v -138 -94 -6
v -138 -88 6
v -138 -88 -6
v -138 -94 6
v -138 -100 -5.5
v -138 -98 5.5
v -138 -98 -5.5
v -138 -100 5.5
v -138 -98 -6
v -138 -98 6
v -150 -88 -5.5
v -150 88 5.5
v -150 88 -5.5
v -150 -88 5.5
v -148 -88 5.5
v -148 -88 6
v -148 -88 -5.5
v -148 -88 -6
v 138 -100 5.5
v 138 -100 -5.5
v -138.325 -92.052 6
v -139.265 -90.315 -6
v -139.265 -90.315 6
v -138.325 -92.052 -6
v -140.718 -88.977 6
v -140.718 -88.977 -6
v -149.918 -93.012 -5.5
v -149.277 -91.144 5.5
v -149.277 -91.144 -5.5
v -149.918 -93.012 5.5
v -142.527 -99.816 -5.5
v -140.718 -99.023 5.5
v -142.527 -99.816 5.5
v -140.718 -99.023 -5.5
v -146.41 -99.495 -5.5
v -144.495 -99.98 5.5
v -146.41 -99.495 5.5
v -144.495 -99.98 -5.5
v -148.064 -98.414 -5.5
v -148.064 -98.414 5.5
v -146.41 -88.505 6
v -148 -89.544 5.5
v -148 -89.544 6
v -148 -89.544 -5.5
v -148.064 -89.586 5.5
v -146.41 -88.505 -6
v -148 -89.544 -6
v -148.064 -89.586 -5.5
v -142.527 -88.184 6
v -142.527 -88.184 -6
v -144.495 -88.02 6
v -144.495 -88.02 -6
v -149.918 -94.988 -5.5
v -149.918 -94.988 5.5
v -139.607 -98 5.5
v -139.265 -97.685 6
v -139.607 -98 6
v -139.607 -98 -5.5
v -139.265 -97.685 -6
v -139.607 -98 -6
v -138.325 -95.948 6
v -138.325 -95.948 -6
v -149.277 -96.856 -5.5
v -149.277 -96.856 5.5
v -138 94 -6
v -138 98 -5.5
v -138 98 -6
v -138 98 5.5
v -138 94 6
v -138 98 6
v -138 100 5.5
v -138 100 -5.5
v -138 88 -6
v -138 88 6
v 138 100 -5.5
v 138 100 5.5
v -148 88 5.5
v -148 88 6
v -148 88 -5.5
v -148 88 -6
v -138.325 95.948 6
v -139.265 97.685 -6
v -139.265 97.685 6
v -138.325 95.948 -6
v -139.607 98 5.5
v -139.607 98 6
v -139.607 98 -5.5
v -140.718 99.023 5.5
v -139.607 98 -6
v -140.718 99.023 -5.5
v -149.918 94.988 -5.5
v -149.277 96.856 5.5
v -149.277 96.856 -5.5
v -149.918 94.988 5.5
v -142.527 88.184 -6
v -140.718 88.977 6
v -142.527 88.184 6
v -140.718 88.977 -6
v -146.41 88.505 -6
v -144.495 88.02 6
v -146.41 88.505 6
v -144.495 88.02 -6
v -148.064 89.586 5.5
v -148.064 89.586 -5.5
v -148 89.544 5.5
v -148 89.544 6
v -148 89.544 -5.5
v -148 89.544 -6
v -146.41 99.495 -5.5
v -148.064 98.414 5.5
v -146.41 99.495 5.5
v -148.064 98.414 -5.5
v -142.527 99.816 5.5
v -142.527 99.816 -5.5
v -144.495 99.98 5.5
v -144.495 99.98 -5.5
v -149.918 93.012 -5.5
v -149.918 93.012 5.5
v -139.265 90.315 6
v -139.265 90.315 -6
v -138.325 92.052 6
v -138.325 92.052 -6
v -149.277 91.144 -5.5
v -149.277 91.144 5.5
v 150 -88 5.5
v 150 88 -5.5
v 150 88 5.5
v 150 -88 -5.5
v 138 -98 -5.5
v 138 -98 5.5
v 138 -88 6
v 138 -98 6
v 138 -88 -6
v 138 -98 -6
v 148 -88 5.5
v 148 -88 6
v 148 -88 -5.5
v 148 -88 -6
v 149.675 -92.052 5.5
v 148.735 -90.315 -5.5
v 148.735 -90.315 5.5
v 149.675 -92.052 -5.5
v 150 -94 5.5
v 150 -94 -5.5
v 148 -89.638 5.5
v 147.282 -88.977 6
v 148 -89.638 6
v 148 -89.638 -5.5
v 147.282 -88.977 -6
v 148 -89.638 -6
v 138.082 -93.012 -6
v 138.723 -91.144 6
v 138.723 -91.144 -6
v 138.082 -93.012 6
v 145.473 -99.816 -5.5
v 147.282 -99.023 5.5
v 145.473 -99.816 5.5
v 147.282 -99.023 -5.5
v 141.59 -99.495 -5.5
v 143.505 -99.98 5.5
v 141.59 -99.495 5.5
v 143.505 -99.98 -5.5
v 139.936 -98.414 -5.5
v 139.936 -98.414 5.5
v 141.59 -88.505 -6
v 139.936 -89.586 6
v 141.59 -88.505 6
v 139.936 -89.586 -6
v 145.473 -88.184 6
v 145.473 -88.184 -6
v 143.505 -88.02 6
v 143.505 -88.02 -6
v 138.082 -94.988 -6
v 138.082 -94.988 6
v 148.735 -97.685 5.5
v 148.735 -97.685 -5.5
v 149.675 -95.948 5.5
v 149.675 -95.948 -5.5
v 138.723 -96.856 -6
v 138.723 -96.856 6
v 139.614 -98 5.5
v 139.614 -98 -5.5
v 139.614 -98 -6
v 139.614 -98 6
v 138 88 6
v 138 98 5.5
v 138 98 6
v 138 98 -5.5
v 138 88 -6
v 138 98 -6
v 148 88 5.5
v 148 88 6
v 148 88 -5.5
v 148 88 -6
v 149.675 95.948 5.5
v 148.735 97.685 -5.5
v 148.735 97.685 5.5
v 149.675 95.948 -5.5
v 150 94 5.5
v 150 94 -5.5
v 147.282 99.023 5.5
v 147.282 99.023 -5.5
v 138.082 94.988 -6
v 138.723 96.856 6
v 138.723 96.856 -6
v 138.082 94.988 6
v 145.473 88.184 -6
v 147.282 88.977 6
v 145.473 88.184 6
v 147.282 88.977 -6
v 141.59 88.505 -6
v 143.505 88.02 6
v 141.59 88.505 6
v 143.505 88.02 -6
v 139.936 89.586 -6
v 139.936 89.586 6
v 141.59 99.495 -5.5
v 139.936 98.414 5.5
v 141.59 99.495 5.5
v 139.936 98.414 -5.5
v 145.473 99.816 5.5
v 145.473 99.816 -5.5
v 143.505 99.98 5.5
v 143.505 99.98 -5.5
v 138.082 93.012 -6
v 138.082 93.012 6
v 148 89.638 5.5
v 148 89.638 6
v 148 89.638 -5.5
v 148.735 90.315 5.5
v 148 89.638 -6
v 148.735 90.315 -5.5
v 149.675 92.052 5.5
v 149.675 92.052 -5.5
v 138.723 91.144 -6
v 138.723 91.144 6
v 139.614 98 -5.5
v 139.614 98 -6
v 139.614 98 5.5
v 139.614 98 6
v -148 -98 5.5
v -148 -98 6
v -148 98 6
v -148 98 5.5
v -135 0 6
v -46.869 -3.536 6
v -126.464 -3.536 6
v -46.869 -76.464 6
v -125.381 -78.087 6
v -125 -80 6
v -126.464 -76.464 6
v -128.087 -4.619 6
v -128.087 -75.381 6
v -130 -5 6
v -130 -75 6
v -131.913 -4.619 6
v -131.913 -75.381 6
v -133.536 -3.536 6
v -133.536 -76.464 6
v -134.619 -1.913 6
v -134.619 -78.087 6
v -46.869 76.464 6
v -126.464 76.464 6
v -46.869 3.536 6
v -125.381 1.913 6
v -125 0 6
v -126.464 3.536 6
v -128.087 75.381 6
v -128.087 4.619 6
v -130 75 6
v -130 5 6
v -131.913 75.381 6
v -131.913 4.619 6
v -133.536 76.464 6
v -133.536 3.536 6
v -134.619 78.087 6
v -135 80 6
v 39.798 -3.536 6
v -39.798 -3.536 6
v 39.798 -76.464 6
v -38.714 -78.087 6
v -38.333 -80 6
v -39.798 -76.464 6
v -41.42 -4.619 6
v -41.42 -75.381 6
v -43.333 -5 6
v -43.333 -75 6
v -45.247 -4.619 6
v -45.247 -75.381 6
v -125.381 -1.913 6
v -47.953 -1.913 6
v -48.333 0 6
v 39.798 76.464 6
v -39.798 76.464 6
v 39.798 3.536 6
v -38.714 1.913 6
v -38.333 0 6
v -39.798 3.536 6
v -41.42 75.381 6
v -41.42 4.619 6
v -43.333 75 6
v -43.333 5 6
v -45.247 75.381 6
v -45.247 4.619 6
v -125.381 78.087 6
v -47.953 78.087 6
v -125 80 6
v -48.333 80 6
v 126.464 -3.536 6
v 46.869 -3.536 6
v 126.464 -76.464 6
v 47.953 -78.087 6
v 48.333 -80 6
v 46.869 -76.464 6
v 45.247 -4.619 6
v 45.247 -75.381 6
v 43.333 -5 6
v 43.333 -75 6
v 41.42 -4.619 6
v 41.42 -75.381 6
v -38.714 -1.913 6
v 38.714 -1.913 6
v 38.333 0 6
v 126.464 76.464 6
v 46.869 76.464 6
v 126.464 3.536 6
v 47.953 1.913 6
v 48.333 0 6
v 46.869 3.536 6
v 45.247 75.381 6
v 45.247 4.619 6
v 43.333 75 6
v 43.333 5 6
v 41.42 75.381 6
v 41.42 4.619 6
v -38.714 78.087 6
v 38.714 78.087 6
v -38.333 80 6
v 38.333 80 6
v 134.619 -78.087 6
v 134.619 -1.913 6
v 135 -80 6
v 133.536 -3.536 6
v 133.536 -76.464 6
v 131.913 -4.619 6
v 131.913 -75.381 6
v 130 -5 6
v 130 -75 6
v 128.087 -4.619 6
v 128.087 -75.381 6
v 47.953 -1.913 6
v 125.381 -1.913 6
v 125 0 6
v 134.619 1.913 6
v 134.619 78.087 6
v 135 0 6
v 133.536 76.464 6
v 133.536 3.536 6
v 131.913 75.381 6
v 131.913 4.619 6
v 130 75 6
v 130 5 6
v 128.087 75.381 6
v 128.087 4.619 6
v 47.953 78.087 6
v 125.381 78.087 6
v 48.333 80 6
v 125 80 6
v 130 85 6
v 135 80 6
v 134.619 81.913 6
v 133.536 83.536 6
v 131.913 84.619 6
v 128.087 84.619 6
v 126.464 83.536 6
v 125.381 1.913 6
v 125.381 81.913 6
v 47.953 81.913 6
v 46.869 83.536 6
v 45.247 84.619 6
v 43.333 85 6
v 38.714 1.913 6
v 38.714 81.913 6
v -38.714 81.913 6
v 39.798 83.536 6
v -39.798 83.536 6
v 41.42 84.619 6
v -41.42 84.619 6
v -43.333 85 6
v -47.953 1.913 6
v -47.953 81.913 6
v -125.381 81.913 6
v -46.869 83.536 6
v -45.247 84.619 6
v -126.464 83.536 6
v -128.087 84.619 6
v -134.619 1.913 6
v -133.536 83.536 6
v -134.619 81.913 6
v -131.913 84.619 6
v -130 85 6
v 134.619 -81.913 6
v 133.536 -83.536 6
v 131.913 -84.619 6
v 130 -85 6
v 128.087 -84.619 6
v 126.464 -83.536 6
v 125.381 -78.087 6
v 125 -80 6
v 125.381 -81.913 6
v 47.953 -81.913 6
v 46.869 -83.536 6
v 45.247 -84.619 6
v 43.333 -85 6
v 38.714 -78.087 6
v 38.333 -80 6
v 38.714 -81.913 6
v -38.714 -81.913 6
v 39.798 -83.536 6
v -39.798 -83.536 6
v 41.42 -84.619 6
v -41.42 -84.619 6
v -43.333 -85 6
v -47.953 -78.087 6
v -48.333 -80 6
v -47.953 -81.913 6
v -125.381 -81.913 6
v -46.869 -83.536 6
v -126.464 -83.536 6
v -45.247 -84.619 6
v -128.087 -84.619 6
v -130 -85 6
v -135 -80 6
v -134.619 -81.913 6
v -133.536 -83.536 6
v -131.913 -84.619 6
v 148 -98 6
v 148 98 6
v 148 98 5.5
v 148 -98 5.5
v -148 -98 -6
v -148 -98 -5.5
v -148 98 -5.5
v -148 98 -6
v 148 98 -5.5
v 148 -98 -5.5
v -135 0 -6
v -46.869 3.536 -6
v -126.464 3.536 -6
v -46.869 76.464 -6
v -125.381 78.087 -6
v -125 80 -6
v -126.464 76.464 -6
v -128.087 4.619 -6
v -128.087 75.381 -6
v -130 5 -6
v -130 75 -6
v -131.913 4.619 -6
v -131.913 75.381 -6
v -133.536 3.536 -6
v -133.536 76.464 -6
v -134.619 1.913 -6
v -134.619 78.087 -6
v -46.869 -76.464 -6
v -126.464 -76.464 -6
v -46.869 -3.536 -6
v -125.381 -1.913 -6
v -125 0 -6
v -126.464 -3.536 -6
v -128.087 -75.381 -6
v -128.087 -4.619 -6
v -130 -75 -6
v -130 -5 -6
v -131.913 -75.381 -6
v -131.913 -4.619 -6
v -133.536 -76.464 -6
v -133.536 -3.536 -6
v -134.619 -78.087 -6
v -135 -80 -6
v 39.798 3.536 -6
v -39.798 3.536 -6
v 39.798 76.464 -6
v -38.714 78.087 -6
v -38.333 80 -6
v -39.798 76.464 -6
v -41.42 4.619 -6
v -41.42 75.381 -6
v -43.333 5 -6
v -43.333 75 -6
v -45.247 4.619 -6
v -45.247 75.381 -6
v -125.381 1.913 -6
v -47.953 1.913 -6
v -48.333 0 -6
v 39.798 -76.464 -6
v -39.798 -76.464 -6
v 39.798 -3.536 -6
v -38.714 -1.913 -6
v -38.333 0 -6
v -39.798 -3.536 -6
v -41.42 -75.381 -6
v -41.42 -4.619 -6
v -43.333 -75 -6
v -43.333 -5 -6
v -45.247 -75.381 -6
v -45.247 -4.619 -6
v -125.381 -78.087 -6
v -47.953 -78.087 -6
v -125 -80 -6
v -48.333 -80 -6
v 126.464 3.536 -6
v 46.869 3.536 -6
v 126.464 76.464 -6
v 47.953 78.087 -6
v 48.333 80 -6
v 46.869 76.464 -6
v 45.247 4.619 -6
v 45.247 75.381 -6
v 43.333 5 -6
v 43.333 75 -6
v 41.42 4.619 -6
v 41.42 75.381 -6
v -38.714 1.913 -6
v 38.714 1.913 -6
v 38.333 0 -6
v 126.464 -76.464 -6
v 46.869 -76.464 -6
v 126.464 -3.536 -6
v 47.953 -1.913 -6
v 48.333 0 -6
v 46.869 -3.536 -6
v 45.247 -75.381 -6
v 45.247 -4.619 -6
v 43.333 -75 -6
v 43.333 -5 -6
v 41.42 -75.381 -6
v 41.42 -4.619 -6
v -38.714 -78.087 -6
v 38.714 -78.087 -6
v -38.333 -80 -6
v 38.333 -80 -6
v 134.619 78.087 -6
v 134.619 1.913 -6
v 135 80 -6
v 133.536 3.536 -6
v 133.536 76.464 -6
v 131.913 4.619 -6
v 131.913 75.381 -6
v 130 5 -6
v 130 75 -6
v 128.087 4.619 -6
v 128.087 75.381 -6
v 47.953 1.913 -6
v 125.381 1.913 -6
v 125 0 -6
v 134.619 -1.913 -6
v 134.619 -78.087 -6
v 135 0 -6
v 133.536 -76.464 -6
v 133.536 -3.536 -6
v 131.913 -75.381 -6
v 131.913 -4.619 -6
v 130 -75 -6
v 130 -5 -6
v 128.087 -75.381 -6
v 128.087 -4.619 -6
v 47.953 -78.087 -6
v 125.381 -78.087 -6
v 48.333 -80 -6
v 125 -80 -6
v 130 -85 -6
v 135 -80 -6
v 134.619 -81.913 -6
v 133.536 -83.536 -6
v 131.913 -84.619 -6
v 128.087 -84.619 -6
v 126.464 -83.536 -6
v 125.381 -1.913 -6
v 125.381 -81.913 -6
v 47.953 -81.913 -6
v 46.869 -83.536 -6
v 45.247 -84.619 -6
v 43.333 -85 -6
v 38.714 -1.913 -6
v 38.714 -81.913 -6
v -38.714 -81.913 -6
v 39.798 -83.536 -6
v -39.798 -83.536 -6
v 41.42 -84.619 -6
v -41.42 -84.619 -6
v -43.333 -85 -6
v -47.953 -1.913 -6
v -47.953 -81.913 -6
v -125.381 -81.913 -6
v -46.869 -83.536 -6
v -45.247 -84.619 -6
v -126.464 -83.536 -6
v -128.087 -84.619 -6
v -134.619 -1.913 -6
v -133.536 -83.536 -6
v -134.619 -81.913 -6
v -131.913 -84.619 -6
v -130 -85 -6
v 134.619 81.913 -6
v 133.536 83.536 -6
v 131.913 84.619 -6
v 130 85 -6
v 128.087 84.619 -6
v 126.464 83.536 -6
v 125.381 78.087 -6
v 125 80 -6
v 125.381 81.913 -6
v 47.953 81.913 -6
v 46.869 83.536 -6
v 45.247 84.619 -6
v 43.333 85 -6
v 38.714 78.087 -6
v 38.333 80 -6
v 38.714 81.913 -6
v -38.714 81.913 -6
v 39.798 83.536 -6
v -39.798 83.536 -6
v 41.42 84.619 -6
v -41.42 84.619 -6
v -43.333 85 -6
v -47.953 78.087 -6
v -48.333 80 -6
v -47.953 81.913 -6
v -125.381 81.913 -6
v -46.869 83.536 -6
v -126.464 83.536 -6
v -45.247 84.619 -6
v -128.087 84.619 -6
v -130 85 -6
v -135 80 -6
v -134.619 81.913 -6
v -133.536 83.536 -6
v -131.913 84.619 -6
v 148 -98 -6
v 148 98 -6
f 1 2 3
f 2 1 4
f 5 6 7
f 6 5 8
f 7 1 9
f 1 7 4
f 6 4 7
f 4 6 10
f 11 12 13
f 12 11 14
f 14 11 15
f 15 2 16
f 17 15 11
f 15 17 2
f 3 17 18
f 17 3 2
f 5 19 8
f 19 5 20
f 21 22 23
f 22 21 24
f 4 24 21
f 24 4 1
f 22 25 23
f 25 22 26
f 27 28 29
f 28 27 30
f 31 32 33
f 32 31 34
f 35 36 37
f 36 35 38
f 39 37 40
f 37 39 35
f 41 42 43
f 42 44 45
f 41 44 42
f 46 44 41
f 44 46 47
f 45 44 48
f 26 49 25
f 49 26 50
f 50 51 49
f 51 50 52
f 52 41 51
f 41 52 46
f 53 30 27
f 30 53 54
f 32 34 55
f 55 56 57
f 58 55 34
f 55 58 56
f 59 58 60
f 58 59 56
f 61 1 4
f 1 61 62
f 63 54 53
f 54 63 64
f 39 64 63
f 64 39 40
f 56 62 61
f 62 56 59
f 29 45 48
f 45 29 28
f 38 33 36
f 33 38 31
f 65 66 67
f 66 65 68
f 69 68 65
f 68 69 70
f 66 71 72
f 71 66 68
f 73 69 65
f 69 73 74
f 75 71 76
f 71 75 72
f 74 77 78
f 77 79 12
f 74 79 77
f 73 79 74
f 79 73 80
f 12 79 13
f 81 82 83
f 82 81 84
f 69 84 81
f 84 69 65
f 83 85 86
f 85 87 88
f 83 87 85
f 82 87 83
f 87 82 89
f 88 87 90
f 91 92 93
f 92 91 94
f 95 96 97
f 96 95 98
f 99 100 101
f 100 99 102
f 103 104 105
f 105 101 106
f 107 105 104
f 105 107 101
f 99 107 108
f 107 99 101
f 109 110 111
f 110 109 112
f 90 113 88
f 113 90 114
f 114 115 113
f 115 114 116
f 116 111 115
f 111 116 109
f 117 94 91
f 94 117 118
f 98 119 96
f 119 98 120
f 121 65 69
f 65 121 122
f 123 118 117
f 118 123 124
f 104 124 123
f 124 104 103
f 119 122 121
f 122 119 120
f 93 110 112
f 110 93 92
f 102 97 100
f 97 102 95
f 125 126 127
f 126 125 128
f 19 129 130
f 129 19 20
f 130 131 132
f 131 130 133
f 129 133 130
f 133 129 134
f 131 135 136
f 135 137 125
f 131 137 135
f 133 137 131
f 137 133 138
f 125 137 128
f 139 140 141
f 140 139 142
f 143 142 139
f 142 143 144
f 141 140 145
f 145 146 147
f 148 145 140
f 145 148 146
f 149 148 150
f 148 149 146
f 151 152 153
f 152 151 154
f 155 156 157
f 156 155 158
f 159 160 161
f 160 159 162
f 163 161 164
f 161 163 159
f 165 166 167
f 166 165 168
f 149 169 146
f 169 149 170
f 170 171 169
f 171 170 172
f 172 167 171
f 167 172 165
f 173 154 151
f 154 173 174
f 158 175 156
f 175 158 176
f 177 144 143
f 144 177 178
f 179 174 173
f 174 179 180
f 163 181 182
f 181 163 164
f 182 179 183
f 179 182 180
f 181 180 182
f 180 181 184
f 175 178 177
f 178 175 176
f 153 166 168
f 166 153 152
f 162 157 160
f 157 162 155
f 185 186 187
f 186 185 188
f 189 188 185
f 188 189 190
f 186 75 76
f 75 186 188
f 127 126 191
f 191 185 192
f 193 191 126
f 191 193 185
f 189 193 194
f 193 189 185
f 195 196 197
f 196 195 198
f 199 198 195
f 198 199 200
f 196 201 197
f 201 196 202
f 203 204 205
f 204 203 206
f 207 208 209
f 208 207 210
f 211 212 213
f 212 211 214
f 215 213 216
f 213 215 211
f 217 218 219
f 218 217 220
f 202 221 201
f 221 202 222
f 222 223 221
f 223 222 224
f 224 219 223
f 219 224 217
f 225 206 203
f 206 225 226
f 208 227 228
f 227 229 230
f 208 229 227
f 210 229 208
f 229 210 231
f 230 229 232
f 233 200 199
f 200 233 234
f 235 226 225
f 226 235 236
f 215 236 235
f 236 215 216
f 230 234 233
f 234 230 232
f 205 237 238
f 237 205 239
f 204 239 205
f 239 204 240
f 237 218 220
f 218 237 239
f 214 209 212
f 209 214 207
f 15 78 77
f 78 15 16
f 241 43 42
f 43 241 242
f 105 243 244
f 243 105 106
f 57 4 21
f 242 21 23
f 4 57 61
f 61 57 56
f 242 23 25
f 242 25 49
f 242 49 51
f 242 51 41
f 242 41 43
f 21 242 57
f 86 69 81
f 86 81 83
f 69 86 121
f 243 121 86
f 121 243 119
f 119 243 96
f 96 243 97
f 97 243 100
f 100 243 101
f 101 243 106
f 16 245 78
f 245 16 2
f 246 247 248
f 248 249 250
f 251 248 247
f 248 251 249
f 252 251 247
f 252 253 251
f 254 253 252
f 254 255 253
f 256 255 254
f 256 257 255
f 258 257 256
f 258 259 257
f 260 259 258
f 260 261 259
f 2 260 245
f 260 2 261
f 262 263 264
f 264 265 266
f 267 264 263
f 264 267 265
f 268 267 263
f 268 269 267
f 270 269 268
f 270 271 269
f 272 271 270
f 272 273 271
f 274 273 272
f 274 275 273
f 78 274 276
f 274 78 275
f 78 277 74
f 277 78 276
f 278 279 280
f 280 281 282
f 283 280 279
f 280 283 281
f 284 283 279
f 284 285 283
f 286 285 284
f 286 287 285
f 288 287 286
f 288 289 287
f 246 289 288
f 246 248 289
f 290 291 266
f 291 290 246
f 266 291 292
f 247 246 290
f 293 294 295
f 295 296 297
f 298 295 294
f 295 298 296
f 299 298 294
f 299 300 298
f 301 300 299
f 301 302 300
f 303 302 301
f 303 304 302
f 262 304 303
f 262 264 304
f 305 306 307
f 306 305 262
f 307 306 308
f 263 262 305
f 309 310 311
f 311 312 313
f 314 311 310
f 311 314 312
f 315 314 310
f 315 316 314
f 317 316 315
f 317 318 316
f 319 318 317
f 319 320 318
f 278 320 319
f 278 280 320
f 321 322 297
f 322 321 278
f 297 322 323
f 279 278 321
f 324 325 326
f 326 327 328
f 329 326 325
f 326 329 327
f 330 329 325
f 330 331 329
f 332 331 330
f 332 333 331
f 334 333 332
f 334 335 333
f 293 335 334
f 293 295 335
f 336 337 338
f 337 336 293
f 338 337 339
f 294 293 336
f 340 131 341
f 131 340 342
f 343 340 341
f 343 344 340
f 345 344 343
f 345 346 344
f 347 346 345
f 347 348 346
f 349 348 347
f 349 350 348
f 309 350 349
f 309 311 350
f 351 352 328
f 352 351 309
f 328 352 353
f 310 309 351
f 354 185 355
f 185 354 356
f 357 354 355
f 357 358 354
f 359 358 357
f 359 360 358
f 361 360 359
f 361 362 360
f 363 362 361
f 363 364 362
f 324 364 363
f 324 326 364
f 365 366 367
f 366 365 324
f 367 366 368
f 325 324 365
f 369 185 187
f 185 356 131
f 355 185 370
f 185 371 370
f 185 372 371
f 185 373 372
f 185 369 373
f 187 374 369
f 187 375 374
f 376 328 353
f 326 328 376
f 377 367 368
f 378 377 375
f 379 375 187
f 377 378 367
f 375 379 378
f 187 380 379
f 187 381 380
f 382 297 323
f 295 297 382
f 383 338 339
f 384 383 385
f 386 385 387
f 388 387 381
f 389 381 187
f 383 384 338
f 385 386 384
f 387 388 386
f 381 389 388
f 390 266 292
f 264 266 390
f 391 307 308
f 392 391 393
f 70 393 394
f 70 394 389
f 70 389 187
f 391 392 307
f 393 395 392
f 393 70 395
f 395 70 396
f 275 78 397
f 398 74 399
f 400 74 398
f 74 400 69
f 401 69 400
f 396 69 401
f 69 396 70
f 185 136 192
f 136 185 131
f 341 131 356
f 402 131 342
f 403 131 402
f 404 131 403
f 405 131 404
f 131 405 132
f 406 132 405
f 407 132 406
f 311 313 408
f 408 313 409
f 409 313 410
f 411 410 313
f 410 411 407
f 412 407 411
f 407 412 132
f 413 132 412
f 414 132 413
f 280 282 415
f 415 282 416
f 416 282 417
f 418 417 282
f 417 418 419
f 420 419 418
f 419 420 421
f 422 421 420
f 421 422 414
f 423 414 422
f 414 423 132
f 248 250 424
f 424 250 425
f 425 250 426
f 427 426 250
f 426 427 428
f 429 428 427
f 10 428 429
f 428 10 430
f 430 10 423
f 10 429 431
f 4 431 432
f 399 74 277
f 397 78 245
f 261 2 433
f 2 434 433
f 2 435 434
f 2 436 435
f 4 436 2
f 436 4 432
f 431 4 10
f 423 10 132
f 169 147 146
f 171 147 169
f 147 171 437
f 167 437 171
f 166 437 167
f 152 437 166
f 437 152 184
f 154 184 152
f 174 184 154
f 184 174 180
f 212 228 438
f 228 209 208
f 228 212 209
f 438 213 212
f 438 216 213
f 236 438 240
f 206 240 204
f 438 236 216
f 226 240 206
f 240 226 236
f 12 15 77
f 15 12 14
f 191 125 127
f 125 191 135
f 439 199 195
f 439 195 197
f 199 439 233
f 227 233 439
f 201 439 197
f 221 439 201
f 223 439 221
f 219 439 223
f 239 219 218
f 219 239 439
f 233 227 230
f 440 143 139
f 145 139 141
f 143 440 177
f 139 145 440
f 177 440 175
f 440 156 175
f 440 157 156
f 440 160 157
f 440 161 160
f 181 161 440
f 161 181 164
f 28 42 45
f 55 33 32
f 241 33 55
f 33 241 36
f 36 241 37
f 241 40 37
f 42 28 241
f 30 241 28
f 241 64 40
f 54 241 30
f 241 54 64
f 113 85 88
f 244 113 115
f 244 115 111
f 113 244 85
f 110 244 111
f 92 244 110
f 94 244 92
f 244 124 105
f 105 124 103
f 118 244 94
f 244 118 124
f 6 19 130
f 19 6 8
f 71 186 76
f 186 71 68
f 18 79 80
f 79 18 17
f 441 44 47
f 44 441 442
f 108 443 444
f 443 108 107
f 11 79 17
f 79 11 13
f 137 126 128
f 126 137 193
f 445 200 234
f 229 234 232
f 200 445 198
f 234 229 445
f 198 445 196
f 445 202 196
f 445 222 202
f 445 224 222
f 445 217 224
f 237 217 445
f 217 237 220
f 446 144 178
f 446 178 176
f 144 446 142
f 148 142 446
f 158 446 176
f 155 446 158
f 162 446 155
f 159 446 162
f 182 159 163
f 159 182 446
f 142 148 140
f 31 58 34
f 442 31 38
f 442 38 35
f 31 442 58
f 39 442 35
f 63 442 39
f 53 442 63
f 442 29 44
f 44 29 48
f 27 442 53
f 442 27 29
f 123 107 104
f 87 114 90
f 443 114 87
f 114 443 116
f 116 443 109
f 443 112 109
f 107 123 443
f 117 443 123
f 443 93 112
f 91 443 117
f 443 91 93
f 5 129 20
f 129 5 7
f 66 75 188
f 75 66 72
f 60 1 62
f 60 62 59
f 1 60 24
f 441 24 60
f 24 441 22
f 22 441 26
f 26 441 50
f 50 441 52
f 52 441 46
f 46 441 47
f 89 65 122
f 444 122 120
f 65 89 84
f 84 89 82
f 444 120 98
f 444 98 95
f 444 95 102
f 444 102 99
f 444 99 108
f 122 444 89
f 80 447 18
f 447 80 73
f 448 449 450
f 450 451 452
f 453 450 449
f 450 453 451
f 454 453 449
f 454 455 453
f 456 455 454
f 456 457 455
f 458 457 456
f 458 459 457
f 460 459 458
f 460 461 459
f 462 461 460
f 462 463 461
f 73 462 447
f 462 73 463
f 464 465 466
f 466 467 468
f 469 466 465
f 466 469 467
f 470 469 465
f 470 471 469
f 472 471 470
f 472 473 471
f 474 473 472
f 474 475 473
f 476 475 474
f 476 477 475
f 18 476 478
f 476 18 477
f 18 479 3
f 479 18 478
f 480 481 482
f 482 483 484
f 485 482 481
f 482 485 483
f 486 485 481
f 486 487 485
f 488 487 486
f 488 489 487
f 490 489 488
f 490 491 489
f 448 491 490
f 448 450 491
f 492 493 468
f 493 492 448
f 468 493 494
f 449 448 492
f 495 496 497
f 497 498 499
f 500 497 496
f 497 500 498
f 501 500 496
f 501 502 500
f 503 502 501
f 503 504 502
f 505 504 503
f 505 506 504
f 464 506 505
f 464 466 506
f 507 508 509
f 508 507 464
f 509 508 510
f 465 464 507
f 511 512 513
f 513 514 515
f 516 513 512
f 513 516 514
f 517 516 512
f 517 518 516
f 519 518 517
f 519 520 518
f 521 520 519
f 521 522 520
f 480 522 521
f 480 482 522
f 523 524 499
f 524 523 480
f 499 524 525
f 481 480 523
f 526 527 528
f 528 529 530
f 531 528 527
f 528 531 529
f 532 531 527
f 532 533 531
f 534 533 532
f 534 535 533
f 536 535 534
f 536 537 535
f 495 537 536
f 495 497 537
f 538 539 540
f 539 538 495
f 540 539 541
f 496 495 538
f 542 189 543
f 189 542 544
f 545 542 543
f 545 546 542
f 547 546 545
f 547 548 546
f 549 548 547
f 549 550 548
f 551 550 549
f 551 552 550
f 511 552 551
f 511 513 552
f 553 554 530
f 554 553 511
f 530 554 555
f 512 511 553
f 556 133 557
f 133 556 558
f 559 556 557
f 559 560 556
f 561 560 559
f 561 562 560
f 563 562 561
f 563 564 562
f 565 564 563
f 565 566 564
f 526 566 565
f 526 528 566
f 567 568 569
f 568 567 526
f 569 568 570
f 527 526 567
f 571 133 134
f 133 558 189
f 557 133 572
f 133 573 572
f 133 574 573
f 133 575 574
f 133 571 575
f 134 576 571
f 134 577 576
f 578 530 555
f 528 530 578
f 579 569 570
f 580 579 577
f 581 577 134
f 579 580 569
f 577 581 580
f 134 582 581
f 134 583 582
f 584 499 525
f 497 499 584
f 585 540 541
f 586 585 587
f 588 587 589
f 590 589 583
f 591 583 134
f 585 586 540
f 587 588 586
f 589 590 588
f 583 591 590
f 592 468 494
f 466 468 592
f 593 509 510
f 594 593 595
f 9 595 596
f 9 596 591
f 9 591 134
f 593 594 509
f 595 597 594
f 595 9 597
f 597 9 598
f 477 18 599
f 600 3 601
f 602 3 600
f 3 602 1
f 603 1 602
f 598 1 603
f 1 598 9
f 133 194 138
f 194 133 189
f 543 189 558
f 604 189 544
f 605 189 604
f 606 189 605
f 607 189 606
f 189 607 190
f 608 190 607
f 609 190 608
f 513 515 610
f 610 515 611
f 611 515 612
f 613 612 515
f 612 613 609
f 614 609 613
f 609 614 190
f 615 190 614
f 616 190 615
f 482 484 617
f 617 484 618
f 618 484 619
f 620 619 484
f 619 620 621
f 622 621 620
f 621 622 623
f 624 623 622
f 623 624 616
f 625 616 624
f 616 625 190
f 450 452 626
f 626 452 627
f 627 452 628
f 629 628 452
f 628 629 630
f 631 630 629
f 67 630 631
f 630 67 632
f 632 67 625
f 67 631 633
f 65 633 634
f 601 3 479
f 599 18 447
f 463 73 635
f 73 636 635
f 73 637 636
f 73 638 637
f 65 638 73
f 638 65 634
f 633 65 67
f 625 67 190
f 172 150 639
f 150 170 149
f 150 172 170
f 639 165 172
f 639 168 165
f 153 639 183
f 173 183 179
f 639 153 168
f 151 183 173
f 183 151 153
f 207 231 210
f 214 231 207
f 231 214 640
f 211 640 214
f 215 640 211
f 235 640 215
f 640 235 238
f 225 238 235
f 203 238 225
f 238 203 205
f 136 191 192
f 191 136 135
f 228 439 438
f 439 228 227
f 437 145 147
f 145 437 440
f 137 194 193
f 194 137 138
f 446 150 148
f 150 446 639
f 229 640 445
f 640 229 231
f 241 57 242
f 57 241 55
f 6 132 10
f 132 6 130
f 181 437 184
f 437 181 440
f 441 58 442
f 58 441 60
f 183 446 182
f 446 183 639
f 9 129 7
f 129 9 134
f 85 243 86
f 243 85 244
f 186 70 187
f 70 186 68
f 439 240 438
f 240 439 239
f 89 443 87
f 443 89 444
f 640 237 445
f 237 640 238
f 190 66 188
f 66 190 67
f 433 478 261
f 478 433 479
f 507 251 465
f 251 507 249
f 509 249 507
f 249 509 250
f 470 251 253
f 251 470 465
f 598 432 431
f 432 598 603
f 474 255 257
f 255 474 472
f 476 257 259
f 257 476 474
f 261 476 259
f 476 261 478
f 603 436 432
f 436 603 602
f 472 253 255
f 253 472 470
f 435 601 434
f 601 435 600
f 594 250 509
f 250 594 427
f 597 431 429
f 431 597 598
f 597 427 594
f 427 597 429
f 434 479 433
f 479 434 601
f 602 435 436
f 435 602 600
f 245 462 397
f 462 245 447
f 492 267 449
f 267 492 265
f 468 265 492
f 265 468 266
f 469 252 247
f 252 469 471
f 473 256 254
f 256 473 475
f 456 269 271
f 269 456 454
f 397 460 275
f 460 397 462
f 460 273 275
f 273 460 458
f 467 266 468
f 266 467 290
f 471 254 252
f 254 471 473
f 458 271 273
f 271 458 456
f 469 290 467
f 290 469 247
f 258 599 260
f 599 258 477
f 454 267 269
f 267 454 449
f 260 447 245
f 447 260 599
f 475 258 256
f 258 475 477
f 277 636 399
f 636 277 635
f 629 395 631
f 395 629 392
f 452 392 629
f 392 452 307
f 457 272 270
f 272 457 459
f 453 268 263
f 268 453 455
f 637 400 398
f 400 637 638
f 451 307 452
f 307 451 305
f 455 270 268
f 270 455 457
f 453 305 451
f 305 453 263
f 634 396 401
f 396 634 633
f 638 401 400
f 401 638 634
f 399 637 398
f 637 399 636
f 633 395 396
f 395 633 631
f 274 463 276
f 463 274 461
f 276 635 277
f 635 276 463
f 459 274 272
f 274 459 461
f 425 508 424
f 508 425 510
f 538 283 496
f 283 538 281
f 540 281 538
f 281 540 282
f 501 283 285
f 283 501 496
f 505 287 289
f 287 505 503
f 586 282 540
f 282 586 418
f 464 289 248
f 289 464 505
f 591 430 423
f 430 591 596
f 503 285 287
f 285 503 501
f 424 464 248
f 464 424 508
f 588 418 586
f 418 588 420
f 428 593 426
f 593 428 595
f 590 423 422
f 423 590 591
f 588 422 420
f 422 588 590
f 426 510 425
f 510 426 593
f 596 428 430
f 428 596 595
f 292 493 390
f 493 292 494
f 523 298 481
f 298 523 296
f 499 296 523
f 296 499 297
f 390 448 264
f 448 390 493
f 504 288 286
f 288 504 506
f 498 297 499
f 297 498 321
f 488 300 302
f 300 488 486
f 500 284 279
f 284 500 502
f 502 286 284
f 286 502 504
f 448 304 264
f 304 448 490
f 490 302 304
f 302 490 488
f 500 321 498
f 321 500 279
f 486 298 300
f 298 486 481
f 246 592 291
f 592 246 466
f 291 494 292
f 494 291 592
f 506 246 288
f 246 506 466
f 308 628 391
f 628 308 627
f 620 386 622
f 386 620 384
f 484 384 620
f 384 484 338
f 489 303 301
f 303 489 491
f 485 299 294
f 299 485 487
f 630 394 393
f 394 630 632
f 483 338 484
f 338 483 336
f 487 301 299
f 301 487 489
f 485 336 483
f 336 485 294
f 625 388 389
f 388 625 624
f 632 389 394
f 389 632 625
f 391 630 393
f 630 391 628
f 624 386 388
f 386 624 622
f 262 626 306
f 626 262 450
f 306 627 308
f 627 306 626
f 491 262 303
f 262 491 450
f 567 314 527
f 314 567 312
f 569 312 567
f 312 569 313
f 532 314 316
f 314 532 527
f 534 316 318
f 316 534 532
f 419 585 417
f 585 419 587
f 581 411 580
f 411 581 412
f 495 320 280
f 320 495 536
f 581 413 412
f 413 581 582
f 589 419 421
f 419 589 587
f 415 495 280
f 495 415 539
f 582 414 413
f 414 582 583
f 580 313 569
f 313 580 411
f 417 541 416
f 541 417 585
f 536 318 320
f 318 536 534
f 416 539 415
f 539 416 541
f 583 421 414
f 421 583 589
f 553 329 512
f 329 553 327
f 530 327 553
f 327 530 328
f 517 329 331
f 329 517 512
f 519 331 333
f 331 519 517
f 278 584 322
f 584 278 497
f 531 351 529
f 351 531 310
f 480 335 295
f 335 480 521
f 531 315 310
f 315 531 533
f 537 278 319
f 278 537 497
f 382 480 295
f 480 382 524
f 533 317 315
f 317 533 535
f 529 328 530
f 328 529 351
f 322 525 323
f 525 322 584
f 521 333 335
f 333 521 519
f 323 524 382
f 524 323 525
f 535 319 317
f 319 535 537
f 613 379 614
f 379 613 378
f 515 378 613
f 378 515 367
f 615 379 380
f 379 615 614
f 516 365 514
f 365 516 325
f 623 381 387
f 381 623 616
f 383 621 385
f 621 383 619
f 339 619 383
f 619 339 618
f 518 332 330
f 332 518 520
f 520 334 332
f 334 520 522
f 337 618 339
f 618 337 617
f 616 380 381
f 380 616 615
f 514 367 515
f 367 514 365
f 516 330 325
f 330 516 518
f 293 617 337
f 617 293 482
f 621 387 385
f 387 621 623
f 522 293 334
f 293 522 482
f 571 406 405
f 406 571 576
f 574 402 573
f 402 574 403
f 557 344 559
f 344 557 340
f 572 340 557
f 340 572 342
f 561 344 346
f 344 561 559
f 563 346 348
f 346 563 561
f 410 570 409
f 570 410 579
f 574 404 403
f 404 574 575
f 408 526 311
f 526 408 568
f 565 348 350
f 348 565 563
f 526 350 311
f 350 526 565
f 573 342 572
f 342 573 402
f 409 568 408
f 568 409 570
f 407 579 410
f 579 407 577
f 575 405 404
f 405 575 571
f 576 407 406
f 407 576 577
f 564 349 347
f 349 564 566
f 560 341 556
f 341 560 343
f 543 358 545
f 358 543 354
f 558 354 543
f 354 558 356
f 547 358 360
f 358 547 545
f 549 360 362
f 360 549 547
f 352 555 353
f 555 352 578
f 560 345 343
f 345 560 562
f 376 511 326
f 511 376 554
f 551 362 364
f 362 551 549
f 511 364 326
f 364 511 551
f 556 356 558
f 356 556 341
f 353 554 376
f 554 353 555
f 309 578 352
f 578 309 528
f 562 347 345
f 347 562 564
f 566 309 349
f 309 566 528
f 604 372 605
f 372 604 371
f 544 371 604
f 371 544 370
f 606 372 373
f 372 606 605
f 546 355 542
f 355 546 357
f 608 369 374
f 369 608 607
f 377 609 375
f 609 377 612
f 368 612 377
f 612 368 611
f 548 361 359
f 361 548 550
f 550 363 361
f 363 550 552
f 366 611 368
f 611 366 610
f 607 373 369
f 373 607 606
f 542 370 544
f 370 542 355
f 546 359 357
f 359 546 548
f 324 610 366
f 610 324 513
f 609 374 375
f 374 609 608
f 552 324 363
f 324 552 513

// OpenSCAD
// Parameters
plate_length = 300; //[150:600:1]
plate_width = 200; //[100:400:1]
plate_thickness = 12; //[6:24:1]
edge_chamfer = 0.5; //[0.25:2:0.25]
corner_radius = 6; //[3:12:0.5]
chamfer_length = 2; //[1:6:0.5]
mount_hole_diameter = 10; //[4:20:0.5]
mount_hole_edge_margin = 20; //[10:50:1]
mount_hole_count_x = 4; //[2:10:1]
mount_hole_count_y = 3; //[2:10:1]
hole_clearance_z = 2; //[1:6:0.5]

// Main tooling plate with corner rounding and edge chamfer
module tooling_plate() {
  difference() {
    // Base plate
    color("Silver")
    cube([plate_length, plate_width, plate_thickness], center=true);

    // Corner rounding
    for (x = [-1, 1], y = [-1, 1]) {
      translate([x * (plate_length/2 - corner_radius), y * (plate_width/2 - corner_radius), 0])
        difference() {
          cube([corner_radius*2, corner_radius*2, plate_thickness + hole_clearance_z], center=true);
          cylinder(r=corner_radius, h=plate_thickness + hole_clearance_z, center=true);
        }
    }

    // Edge chamfers
    for (x = [-1, 1]) {
      translate([x * (plate_length/2 - chamfer_length/2), 0, plate_thickness/2 - edge_chamfer/2])
        cube([chamfer_length, plate_width, edge_chamfer], center=true);
      translate([x * (plate_length/2 - chamfer_length/2), 0, -plate_thickness/2 + edge_chamfer/2])
        cube([chamfer_length, plate_width, edge_chamfer], center=true);
    }
    for (y = [-1, 1]) {
      translate([0, y * (plate_width/2 - chamfer_length/2), plate_thickness/2 - edge_chamfer/2])
        cube([plate_length, chamfer_length, edge_chamfer], center=true);
      translate([0, y * (plate_width/2 - chamfer_length/2), -plate_thickness/2 + edge_chamfer/2])
        cube([plate_length, chamfer_length, edge_chamfer], center=true);
    }
  }
}

// Mounting holes pattern
module mounting_holes() {
  color("Black")
  for (i = [0:mount_hole_count_x-1], j = [0:mount_hole_count_y-1]) {
    translate([
      -plate_length/2 + mount_hole_edge_margin + i * (plate_length - 2*mount_hole_edge_margin) / (mount_hole_count_x - 1),
      -plate_width/2 + mount_hole_edge_margin + j * (plate_width - 2*mount_hole_edge_margin) / (mount_hole_count_y - 1),
      0
    ])
    cylinder(r=mount_hole_diameter/2, h=plate_thickness + hole_clearance_z, center=true);
  }
}

// Final assembly
difference() {
  tooling_plate();
  mounting_holes();
}
